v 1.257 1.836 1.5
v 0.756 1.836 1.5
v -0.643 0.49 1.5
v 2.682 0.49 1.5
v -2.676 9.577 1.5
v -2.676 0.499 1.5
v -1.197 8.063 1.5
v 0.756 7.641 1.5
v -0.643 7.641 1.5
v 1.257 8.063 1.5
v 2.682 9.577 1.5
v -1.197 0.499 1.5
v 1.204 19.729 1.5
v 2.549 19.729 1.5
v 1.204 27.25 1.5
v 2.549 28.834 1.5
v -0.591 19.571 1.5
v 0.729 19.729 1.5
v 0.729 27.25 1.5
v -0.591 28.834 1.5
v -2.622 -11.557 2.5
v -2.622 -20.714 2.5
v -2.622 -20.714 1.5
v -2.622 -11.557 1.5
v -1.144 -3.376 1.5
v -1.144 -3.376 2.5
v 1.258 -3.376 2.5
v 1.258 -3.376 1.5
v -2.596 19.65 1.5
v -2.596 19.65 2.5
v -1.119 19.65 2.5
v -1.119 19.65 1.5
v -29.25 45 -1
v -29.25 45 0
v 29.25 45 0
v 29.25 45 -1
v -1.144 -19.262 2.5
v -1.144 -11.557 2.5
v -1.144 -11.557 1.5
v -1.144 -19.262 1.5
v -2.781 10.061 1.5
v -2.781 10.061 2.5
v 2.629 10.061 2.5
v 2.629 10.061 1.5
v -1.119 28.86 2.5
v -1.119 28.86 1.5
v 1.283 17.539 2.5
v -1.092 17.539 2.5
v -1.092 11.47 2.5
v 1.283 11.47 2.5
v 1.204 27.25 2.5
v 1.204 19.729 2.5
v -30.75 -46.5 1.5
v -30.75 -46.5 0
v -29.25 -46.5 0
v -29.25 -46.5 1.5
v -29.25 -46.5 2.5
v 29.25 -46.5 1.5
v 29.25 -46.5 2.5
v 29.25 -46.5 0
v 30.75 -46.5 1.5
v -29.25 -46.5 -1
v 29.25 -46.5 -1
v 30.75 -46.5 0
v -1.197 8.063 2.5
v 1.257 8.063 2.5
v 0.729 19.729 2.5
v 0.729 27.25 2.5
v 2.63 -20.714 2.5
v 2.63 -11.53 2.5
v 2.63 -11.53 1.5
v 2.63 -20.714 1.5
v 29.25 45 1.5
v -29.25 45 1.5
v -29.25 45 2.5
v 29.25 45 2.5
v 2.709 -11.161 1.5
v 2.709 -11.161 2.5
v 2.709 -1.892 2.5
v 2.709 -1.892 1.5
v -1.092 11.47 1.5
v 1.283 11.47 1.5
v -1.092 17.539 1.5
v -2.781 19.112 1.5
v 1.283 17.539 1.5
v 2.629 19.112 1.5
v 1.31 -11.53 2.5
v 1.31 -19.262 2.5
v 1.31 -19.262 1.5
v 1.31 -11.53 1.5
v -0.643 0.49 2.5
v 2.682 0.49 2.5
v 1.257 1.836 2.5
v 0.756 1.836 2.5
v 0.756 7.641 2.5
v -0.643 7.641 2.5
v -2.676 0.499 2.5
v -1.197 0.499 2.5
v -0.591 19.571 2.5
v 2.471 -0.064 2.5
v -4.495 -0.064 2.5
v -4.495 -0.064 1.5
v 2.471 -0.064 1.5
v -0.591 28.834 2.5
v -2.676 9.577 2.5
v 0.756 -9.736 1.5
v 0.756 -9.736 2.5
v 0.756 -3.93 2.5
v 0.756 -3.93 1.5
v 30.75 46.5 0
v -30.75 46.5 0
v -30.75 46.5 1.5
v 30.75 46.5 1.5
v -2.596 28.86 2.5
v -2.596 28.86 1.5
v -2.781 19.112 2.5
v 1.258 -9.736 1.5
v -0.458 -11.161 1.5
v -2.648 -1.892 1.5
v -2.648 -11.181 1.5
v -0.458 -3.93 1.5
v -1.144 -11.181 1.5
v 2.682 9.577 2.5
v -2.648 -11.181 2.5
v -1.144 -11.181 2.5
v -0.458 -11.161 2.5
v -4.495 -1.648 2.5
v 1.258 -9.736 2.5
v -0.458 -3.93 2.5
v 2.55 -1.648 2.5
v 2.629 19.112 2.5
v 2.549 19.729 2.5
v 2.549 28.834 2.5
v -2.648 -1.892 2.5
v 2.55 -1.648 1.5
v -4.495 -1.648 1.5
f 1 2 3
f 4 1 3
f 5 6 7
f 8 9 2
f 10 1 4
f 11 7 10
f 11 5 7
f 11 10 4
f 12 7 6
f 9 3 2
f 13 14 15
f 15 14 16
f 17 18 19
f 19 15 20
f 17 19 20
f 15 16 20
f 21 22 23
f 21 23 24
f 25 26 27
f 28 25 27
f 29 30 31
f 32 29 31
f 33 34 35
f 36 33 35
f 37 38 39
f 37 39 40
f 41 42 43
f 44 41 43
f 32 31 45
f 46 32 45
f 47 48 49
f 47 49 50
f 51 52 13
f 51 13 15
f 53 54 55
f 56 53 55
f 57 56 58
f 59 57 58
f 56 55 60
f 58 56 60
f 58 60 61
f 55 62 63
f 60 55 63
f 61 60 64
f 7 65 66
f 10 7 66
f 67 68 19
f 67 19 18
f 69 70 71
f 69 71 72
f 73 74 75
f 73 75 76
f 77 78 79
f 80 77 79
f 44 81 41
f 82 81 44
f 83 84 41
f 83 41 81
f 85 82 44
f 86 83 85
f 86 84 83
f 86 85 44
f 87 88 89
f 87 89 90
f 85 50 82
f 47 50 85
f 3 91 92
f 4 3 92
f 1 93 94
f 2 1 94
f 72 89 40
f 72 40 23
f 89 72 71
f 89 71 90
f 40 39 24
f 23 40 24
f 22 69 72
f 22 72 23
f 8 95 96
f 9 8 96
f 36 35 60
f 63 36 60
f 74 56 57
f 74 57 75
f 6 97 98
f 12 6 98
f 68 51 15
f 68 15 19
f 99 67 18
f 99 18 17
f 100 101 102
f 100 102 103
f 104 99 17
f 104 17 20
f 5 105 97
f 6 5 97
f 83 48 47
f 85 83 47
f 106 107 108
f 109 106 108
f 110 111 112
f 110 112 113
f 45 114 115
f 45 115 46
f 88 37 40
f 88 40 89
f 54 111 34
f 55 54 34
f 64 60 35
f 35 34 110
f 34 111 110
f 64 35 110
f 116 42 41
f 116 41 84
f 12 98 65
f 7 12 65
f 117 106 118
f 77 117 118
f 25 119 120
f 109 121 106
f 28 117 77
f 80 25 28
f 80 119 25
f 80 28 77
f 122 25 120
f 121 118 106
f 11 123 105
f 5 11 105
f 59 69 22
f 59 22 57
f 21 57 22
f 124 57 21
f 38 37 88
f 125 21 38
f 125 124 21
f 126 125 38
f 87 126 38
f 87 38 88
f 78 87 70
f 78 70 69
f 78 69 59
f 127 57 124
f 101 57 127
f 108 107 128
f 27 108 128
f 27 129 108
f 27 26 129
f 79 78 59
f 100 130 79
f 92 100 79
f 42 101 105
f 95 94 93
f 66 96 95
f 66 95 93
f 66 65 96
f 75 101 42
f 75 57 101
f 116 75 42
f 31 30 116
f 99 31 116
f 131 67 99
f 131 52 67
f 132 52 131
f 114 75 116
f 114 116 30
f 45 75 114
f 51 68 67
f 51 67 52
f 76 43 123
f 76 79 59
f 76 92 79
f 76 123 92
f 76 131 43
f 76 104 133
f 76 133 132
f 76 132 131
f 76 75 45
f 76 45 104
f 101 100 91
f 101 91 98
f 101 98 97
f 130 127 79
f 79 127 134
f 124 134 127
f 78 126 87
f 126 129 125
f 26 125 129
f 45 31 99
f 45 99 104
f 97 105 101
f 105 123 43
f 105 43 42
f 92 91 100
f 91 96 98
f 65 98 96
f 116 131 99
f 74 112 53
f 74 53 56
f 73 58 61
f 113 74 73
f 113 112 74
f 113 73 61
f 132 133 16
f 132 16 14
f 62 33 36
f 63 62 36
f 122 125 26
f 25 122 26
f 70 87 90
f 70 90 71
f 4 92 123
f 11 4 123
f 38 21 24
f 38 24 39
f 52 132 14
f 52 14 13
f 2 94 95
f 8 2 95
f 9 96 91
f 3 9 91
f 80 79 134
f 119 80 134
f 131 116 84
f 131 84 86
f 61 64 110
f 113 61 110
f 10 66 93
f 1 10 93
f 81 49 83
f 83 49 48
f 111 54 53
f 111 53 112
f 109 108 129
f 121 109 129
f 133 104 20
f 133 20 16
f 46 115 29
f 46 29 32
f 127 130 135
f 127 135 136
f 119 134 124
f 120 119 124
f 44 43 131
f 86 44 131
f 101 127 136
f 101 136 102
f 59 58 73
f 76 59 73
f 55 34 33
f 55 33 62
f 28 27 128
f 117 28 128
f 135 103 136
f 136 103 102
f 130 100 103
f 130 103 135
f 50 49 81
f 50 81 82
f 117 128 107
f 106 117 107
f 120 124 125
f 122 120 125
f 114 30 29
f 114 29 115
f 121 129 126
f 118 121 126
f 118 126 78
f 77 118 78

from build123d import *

# Parameters (mm, degrees)
SKETCH_W      = 61.5
SKETCH_H      = 93
PAD_DEPTH     = 1.5
SKETCH001_W   = 58.5
SKETCH001_H   = 91.5
PAD001_DEPTH  = 1
SKETCH002_W   = 58.5
SKETCH002_H   = 91.5
PAD002_DEPTH  = 1
SKETCH003_W   = 5.409756
SKETCH003_H   = 9.051441
SKETCH003_W_2 = 2.375015
SKETCH003_H_2 = 6.06948
SKETCH003_W_3 = 1.477786
SKETCH003_H_3 = 9.209776
POCKET_DEPTH  = 1


with BuildPart() as part:
    # Sketch → Pad (new body)
    with BuildSketch(Plane.XY):
        Rectangle(SKETCH_W, SKETCH_H)
    extrude(amount=PAD_DEPTH)

    # Sketch001 → Pad001 (new body)
    with BuildSketch(Plane.XY.offset(1.5)):
        with Locations((0, -0.75)):
            Rectangle(SKETCH001_W, SKETCH001_H)
    extrude(amount=PAD001_DEPTH)

    # Sketch002 → Pad002 (new body)
    with BuildSketch(Plane(origin=(0, 0, 0), x_dir=(1, 0, 0), z_dir=(0, 0, -1))):
        with Locations((0, 0.75)):
            Rectangle(SKETCH002_W, SKETCH002_H)
    extrude(amount=PAD002_DEPTH)

    # Sketch003 → Pocket (cut)
    with BuildSketch(Plane.XY.offset(2.5)):
        Polygon((-2.621542, -11.556755), (-1.143755, -11.556755), (-1.143755, -19.262356), (1.310425, -19.262356), (1.310425, -11.530366), (2.629878, -11.530366), (2.629878, -20.713753), (-2.621542, -20.713753), align=None)
        Polygon((-2.647752, -11.18105), (-1.143755, -11.18105), (-1.143755, -3.376151), (1.257648, -3.376151), (1.257648, -9.735911), (0.756256, -9.735911), (0.756256, -3.930321), (-0.45764, -3.930321), (-0.45764, -11.16092), (2.709045, -11.16092), (2.709045, -1.892107), (-2.647752, -1.892107), align=None)
        Polygon((-4.495397, -0.064355), (2.471311, -0.064355), (2.550478, -1.647698), (-4.495397, -1.647698), align=None)
        Polygon((-2.675537, 0.499041), (-1.196766, 0.499041), (-1.196766, 8.063471), (1.257415, 8.063471), (1.257415, 1.835656), (0.756023, 1.835656), (0.756023, 7.641245), (-0.642597, 7.641245), (-0.642597, 0.489815), (2.682424, 0.489815), (2.682424, 9.576872), (-2.675537, 9.576872), align=None)
        with Locations((-0.076145, 14.5865)):
            Rectangle(SKETCH003_W, SKETCH003_H)
        with Locations((0.095295, 14.504397)):
            Rectangle(SKETCH003_W_2, SKETCH003_H_2, mode=Mode.SUBTRACT)
        with Locations((-1.857495, 24.255149)):
            Rectangle(SKETCH003_W_3, SKETCH003_H_3)
        Polygon((-0.59082, 19.571095), (-0.59082, 28.833649), (2.549475, 28.833649), (2.549475, 19.729427), (1.203635, 19.729427), (1.203635, 27.250305), (0.728631, 27.250305), (0.728631, 19.729427), align=None)
    extrude(amount=-POCKET_DEPTH, mode=Mode.SUBTRACT)


solid = part.part
